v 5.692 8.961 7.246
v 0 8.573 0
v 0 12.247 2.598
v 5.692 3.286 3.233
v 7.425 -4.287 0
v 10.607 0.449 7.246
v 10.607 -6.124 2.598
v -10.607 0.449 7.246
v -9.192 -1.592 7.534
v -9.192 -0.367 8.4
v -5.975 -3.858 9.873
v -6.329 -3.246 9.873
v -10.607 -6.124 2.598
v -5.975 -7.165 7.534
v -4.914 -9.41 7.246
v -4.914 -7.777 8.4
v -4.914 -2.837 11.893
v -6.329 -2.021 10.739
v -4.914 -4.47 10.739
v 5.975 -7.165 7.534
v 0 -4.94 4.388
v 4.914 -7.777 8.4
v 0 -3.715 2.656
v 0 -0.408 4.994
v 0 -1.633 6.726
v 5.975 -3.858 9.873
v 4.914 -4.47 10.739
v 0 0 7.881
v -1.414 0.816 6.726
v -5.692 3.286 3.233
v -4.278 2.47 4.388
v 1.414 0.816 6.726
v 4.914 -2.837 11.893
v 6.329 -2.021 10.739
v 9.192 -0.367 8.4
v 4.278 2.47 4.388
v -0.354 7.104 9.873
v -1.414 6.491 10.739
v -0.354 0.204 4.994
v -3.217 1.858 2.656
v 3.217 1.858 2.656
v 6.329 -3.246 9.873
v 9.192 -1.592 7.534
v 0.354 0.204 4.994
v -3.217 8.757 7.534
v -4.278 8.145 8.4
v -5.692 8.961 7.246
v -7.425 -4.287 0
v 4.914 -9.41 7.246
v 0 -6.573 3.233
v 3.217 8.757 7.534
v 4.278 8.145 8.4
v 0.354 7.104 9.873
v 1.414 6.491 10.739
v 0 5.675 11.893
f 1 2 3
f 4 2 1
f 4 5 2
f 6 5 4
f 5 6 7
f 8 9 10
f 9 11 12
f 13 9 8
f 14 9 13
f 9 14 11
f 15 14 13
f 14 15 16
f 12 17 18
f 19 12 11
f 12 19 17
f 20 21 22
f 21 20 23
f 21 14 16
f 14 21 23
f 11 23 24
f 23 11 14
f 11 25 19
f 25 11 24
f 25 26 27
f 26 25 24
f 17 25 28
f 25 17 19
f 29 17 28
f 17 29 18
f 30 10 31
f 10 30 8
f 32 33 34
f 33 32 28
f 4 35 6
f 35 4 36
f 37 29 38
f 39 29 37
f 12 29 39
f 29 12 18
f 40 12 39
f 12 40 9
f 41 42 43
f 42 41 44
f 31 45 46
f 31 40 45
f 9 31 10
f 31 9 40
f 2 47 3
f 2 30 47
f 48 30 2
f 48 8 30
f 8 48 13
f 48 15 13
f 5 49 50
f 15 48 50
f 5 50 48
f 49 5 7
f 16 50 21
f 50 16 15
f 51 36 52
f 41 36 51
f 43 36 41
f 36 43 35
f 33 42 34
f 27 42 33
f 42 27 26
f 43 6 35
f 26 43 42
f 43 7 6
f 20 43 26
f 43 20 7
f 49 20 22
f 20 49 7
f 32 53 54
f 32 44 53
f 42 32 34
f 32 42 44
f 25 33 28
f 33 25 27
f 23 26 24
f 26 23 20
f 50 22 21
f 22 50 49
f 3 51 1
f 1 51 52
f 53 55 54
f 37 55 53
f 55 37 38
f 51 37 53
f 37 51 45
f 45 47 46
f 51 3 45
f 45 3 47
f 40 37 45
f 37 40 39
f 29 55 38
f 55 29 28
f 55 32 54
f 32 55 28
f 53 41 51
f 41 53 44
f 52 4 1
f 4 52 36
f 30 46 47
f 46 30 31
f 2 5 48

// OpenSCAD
glassThickness = 4.05;
glassSpacer = 0.5;
wallThickness = 2;
mountLength = 15;

rotatedCornerProfile();

module profile()
{
    difference()
    {
        square(mountLength + wallThickness);
        translate([wallThickness + glassThickness + glassSpacer, wallThickness, 0])
        {
            square([mountLength, glassThickness]);
        }
        translate([wallThickness, wallThickness + glassThickness + glassSpacer, 0])
        {
            square([glassThickness, mountLength]);
        }
        translate([2 * wallThickness + glassThickness, 2 * wallThickness + glassThickness + glassSpacer, 0])
        {
            square([mountLength, mountLength]);
        }
        translate([2 * wallThickness + glassThickness, 0, 0])
        {
            square([mountLength, mountLength]);
        }
        translate([0, 2 * wallThickness + glassThickness, 0])
        {
            square([mountLength, mountLength]);
        }
    }
}

module profileExtrude()
{
    difference()
    {
        linear_extrude(height = mountLength)
        {
            profile();
        }
        translate([wallThickness + glassThickness, wallThickness + glassThickness, wallThickness])
        {
            cube([mountLength, mountLength, glassThickness]);
        }
    }
}

module cornerProfile()
{
    difference()
    {
        union()
        {
            profileExtrude();
            rotate([0, 90, 0])
            {
                rotate([0, 0, 90])
                {
                    profileExtrude();
                }
            }
            rotate([-90, 0, 0])
            {
                rotate([0, 0, -90])
                {
                    profileExtrude();
                }
            }
        }
    }
}

module rotatedCornerProfile()
{
    cutOff = 2 * wallThickness + glassSpacer + 6;
    translate([0, 0, -cutOff / sqrt(3)])
    {
        rotate([atan(1/sqrt(2)), 0, 0])
        {
            rotate([0, -45, 0])
            {
                difference()
                {
                    cornerProfile();
                    polyhedron( points  =   [   [-0.1, -0.1, -0.1],
                                                [cutOff, 0, 0],
                                                [0, cutOff, 0],
                                                [0, 0, cutOff],
                                            ],
                                faces   =   [   [0, 1, 2],
                                                [1, 3, 2],
                                                [2, 3, 0],
                                                [3, 1, 0],
                                            ]
                                );
                }
            }
        }
    }
}
